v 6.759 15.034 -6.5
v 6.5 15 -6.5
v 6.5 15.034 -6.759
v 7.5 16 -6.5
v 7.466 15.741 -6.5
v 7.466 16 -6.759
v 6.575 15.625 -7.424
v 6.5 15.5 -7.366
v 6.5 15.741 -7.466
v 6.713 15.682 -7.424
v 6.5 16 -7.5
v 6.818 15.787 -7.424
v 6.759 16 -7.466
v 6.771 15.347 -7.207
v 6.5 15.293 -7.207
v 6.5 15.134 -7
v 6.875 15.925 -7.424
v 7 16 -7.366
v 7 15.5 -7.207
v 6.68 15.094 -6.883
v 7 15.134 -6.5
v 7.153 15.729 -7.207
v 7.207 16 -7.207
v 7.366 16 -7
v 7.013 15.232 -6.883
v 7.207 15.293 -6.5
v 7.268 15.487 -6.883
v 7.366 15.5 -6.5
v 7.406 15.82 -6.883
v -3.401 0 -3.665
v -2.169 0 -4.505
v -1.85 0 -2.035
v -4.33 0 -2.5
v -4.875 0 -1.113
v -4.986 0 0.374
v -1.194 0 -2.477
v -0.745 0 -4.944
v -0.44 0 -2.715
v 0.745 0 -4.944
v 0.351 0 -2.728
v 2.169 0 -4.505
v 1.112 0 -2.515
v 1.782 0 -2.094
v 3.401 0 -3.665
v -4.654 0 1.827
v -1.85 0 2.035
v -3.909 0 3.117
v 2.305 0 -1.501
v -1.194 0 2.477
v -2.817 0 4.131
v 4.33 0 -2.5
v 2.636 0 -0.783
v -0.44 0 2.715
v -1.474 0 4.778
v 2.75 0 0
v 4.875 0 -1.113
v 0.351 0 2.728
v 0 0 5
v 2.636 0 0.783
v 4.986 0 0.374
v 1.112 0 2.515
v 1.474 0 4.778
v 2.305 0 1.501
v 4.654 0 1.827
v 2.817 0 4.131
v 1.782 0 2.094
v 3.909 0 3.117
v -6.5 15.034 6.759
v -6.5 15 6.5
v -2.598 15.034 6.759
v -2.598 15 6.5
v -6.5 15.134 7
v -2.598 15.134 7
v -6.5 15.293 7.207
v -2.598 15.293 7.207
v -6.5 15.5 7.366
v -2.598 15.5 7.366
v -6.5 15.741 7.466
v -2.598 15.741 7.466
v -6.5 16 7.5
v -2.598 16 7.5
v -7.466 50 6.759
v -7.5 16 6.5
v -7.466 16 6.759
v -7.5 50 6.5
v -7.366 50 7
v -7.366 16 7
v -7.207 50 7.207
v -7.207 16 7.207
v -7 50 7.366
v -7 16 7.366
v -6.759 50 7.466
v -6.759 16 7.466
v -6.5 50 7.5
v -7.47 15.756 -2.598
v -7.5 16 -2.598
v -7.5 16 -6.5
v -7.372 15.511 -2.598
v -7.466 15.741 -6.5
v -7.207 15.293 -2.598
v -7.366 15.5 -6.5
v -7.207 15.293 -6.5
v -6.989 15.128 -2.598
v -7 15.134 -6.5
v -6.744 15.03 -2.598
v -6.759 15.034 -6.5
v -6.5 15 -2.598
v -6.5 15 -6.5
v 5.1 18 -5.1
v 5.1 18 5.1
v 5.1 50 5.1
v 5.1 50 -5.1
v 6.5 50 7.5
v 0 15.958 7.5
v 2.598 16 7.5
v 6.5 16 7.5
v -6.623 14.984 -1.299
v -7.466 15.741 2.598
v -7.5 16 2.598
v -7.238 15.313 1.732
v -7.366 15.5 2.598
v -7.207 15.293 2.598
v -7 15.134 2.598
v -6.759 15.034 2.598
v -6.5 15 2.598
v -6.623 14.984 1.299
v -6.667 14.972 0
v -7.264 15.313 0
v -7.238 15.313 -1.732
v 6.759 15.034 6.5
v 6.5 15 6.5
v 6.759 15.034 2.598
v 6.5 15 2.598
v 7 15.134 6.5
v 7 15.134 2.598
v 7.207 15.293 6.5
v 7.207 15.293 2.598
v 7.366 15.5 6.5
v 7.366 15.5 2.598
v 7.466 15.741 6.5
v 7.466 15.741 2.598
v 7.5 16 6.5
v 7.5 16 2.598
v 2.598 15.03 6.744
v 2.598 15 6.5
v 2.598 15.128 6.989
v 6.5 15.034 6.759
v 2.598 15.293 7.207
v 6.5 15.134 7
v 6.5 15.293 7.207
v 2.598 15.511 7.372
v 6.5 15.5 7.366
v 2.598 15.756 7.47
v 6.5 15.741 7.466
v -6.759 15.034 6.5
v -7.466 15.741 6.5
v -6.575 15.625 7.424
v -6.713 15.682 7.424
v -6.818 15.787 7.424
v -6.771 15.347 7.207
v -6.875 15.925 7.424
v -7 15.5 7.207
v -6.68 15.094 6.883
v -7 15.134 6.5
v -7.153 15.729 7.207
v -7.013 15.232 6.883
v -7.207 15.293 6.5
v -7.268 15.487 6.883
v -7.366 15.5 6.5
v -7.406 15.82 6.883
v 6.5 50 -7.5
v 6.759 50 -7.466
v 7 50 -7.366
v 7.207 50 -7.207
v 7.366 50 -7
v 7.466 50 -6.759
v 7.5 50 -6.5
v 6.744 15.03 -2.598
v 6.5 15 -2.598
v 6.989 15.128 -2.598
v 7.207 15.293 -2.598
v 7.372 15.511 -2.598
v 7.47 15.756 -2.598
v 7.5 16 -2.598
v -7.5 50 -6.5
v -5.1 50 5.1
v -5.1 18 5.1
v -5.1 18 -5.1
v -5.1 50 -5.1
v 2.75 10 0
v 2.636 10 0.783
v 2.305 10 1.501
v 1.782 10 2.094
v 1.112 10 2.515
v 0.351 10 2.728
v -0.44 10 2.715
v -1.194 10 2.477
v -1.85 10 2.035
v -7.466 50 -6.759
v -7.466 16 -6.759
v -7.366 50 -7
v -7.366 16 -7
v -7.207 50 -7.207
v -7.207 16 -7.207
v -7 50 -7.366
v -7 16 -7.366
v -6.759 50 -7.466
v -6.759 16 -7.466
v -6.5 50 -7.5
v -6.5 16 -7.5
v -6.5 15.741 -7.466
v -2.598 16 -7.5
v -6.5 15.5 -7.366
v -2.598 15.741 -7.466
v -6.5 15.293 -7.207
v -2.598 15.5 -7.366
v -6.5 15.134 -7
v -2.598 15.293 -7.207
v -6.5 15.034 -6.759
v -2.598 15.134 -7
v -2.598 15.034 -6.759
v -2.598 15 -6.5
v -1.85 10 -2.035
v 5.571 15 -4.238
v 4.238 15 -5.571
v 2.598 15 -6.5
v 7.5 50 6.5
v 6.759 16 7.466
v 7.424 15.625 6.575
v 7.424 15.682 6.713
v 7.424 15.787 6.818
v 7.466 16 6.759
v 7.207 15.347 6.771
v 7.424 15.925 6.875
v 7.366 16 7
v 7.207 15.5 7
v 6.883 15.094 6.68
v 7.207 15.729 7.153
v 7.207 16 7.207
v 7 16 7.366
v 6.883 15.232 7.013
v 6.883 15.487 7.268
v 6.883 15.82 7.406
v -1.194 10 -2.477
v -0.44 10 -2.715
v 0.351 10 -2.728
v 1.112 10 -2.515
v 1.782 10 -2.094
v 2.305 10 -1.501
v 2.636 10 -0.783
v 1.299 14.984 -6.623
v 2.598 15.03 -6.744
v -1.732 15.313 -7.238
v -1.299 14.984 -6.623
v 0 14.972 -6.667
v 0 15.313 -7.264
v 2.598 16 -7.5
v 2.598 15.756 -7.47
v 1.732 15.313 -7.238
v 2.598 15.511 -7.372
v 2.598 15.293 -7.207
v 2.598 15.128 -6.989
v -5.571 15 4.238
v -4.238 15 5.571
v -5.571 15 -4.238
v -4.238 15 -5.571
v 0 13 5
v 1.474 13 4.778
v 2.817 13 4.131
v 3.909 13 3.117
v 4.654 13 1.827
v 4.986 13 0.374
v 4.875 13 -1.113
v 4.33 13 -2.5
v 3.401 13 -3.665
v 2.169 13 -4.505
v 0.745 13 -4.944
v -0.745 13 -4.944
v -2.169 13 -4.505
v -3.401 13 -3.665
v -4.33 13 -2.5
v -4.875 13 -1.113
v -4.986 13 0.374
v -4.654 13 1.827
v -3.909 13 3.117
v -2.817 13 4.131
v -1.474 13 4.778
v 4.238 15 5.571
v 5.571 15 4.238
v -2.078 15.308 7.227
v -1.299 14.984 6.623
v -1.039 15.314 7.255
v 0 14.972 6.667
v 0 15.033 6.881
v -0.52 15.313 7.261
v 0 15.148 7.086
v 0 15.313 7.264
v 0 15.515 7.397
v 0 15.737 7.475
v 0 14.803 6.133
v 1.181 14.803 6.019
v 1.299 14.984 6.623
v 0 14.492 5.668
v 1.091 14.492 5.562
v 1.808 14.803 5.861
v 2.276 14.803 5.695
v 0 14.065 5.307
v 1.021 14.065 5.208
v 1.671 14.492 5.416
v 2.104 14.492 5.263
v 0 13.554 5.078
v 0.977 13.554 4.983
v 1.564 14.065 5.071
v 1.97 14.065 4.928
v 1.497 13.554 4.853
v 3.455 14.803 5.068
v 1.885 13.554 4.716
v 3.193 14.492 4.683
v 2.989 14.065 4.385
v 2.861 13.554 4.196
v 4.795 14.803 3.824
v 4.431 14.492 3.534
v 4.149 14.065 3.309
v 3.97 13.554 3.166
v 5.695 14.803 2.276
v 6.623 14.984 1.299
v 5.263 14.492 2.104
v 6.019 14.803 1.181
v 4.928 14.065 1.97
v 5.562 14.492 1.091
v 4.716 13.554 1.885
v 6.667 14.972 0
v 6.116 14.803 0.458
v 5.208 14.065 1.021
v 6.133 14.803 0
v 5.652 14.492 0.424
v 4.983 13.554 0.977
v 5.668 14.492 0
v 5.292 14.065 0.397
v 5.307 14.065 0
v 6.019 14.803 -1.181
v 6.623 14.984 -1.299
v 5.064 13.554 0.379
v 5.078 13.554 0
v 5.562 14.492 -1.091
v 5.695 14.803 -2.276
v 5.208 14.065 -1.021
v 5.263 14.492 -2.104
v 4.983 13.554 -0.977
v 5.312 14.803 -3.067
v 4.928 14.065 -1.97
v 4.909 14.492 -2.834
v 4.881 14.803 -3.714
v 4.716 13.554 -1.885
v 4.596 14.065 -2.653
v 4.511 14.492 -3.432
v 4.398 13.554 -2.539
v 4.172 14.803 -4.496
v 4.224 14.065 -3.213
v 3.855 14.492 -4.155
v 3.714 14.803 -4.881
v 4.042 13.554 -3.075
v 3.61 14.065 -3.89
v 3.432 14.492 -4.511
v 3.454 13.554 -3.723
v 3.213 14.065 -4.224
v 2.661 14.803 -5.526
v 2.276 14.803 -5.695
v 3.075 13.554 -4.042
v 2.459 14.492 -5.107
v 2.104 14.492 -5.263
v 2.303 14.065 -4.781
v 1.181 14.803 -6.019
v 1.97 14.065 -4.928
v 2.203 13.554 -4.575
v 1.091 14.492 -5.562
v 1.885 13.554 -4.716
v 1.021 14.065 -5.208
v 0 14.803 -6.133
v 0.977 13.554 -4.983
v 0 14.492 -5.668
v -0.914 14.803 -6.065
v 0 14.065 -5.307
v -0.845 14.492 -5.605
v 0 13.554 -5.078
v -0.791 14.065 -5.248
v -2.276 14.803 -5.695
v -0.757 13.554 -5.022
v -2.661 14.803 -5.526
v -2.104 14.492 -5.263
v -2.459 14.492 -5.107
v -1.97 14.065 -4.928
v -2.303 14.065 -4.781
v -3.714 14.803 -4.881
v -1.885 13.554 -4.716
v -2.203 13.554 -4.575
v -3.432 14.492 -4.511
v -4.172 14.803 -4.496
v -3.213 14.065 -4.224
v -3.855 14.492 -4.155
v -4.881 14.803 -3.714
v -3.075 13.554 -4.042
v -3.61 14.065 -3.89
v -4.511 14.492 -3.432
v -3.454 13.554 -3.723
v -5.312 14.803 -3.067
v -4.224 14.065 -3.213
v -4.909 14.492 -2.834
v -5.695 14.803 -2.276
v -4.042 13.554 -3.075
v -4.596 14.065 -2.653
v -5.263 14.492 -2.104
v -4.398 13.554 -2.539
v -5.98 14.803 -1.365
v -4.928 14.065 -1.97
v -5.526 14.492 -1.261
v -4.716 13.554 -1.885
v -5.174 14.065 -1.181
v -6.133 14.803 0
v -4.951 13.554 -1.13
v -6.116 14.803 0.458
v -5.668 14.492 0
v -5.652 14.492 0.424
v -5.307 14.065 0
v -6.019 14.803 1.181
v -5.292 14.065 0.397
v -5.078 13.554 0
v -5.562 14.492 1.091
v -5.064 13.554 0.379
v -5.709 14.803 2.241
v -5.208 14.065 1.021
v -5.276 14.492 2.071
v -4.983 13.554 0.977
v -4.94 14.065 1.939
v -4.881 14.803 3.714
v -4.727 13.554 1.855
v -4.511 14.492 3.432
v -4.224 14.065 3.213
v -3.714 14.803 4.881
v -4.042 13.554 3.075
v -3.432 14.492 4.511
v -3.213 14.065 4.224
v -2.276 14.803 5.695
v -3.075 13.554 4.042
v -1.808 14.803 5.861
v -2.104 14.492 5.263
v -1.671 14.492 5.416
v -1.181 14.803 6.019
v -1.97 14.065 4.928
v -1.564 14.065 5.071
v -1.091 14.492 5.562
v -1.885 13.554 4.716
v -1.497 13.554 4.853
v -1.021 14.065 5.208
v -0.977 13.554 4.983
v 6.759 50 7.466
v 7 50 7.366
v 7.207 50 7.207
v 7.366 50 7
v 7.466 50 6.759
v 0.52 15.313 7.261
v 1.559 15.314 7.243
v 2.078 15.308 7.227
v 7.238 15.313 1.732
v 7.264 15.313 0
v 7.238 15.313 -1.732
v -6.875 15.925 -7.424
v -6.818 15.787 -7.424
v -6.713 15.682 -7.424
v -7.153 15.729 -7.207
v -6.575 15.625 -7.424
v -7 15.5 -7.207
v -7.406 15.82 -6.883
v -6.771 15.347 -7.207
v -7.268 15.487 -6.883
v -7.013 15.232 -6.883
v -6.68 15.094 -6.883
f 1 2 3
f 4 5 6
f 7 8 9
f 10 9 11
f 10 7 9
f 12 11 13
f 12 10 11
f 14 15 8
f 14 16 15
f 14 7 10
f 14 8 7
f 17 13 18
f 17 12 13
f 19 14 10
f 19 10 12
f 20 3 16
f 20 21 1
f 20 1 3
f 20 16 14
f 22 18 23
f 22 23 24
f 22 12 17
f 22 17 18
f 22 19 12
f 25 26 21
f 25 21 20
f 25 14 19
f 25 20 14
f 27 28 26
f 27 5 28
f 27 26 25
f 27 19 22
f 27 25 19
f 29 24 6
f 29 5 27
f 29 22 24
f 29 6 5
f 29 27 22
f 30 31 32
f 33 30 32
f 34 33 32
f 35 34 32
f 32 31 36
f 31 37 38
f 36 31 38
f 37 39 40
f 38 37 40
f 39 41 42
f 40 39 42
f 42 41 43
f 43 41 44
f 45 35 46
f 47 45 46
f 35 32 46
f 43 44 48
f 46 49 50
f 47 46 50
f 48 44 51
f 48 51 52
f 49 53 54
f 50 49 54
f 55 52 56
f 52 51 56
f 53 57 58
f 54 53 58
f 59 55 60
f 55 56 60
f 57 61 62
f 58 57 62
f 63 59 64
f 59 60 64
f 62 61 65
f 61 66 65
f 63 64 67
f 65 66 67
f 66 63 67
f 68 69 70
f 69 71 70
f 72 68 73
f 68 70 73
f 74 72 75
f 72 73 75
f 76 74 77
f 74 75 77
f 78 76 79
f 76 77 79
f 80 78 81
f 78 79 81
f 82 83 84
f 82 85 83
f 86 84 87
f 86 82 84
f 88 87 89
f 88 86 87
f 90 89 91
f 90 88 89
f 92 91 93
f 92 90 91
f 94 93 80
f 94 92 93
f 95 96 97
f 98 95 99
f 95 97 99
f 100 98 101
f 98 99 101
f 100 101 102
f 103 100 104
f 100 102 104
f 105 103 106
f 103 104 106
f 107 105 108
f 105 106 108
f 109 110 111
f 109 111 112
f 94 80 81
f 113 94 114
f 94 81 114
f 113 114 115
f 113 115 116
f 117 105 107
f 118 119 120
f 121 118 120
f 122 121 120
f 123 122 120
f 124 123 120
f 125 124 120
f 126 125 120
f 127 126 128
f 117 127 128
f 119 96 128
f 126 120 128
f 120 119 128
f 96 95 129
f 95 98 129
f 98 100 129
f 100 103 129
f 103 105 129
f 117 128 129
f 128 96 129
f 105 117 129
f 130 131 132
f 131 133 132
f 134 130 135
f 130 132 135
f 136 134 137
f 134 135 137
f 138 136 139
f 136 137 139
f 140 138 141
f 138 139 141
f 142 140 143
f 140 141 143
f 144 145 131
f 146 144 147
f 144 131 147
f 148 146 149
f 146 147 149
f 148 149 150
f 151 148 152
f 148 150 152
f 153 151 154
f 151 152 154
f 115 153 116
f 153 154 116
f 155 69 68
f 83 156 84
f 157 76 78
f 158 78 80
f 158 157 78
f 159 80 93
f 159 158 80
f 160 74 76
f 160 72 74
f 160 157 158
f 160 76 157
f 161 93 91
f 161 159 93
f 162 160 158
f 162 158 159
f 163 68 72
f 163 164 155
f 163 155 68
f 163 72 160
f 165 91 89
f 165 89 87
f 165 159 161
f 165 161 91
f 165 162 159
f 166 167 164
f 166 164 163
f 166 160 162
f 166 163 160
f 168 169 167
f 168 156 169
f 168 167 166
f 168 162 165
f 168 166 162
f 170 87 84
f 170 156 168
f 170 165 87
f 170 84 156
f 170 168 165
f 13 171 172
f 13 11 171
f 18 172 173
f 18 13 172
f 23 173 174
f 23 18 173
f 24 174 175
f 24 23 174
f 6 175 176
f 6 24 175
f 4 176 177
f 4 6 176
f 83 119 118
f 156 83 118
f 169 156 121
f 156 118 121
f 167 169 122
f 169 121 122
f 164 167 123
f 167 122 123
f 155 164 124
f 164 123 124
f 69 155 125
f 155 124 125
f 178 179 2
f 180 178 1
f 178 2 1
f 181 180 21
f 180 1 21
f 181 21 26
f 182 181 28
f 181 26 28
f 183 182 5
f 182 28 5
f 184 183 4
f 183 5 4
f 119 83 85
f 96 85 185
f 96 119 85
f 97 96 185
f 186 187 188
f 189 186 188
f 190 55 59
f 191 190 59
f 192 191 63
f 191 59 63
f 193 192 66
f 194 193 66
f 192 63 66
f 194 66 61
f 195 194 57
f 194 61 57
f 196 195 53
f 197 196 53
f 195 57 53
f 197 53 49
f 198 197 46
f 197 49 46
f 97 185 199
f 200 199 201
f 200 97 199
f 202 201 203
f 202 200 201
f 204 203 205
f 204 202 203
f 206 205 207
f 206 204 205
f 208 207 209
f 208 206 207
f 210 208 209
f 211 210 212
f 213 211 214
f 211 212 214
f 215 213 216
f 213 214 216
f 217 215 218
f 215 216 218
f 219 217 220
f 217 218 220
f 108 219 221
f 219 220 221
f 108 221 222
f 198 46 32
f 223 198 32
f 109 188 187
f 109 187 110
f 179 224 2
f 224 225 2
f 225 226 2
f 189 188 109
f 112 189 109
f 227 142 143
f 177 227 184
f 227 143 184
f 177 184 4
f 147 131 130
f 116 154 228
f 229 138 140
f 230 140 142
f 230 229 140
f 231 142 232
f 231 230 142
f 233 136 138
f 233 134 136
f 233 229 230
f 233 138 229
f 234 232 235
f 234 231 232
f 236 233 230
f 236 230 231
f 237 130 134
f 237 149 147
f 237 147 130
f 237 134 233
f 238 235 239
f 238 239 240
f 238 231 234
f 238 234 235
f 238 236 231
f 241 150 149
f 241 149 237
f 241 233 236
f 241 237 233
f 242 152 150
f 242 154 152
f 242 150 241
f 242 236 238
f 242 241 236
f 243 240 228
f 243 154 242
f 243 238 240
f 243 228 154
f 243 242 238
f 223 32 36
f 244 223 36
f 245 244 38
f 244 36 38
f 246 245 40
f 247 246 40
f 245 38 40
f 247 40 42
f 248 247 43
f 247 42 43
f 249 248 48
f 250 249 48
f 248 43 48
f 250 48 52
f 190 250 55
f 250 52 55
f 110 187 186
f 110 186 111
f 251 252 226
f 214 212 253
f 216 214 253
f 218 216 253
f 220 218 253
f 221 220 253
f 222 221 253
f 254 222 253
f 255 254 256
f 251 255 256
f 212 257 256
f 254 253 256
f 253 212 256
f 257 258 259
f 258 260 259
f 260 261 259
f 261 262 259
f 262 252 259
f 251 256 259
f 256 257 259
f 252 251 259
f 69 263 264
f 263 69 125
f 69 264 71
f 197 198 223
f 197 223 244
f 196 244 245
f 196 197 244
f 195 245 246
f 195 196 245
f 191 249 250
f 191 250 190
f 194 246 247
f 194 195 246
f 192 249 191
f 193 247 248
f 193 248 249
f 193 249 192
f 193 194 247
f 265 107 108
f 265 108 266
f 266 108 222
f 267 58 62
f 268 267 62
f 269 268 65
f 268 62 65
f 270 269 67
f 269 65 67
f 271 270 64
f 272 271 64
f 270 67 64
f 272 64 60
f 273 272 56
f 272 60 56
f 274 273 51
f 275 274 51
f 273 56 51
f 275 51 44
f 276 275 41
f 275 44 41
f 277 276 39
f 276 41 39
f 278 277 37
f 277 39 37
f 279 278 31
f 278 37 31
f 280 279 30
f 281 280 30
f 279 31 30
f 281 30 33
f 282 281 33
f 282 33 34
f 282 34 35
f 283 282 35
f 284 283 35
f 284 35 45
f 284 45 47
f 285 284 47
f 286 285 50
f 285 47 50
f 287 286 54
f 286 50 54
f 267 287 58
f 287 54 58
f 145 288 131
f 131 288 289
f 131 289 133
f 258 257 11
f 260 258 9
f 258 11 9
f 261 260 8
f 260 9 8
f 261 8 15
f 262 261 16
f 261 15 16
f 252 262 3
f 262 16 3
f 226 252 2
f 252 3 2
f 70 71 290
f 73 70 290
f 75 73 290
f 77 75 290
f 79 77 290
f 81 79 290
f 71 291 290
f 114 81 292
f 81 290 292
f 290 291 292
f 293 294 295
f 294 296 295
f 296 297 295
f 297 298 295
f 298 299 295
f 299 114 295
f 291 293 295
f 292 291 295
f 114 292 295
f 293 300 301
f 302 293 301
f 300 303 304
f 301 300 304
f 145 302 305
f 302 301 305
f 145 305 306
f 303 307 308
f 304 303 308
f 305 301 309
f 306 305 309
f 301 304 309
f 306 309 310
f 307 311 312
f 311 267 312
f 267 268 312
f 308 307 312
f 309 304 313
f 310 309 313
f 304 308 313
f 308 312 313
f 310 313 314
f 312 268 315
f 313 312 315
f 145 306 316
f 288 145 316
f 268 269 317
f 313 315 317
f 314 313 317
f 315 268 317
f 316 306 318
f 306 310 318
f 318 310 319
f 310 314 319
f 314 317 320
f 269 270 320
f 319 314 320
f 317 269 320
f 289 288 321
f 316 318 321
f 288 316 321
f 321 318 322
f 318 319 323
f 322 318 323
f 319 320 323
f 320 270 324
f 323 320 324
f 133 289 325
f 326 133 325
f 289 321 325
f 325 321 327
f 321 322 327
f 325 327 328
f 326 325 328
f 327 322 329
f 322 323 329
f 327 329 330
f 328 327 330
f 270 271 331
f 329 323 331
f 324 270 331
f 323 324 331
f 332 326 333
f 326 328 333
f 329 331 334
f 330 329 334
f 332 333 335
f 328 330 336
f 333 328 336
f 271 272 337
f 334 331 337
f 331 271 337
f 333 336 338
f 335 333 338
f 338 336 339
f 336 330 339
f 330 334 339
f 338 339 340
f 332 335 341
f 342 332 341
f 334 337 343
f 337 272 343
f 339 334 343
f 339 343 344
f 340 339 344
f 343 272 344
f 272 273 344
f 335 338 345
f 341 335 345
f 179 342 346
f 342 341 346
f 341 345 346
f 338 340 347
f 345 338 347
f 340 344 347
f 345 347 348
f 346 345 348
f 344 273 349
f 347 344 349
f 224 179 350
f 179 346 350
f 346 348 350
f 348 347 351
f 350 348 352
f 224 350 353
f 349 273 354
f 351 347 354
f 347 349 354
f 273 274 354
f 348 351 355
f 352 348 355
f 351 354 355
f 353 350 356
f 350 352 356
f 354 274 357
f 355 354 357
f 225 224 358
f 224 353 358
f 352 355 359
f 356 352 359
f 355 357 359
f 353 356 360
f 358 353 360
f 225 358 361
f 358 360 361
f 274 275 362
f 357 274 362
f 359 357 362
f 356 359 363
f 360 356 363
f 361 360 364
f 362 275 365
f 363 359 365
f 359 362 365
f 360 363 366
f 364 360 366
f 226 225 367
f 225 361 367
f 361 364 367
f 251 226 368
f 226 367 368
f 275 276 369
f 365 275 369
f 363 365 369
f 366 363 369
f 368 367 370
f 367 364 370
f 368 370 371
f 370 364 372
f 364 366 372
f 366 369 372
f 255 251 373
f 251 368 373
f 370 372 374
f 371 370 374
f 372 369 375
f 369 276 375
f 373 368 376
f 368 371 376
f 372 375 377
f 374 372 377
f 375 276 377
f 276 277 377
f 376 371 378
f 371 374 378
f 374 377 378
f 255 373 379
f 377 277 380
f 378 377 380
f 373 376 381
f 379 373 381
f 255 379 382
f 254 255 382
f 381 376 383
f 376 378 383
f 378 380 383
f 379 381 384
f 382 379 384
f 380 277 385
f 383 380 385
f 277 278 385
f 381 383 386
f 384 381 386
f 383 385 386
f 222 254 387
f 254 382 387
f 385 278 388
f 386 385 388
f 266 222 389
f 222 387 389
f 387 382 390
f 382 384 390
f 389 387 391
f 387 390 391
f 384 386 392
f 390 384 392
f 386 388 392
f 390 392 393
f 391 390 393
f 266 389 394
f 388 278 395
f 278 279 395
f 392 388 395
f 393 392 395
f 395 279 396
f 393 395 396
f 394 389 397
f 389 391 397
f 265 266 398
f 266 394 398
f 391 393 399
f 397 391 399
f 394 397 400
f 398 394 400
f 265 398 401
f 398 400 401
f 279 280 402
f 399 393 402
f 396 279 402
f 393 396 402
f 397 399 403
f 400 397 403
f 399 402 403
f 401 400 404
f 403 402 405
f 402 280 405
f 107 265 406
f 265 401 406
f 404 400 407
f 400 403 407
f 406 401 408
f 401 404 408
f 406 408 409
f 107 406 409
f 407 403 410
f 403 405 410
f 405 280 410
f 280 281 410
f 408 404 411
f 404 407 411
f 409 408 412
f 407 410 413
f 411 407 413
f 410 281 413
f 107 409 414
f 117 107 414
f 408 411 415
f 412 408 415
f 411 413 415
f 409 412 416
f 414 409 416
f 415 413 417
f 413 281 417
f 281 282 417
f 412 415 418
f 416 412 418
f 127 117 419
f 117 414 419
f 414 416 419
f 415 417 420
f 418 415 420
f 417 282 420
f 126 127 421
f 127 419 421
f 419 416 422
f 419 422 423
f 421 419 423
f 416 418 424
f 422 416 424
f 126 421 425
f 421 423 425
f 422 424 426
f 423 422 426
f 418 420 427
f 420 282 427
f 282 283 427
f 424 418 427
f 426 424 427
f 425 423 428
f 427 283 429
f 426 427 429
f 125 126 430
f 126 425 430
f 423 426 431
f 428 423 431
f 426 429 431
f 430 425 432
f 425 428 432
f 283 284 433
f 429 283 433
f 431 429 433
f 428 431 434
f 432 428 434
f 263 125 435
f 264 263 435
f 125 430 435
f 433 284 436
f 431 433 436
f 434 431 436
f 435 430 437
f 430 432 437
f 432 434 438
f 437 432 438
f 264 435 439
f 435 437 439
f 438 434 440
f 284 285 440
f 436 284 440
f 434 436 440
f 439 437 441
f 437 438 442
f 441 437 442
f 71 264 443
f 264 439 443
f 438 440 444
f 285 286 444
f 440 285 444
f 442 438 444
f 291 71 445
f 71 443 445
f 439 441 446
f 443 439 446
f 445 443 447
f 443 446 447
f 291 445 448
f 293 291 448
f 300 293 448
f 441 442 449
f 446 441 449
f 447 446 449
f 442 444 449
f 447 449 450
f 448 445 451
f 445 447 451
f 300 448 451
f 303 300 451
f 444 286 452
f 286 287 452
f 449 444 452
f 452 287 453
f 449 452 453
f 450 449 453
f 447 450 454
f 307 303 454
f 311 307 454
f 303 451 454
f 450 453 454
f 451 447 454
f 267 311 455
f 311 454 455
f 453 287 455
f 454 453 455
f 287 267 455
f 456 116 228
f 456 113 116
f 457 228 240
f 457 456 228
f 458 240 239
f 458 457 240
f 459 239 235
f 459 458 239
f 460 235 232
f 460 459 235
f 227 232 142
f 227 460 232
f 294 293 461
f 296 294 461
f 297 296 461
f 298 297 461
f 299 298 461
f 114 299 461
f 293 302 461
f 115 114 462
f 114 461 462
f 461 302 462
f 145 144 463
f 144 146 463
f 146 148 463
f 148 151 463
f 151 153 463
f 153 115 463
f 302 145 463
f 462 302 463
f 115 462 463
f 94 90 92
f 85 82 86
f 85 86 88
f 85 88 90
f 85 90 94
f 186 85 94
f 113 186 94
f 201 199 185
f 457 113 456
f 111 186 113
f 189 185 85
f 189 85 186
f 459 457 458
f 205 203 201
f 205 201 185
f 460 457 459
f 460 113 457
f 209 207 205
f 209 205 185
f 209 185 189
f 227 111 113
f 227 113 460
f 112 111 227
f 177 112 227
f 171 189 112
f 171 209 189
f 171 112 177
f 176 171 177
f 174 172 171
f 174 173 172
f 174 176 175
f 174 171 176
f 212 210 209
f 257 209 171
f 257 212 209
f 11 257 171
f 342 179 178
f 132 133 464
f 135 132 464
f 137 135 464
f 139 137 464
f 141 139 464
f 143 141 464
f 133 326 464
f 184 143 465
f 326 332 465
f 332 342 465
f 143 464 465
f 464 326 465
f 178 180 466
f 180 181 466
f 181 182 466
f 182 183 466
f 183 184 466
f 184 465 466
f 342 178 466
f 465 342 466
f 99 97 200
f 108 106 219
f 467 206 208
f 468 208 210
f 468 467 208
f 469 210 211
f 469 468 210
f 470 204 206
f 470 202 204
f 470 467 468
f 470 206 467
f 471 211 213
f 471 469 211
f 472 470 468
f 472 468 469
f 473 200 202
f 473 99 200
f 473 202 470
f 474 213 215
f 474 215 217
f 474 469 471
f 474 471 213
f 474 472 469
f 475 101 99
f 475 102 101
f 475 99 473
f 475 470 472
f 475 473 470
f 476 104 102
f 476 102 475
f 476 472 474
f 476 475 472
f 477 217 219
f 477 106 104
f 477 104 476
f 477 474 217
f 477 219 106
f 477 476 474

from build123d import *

# Parameters (mm, degrees)
SKETCH_1_R          = 5
EXTRUDE_1_DEPTH     = 15
SKETCH_2_W          = 15
SKETCH_2_H          = 15
EXTRUDE_2_DEPTH     = 3
FILLET_1_R          = 2
SKETCH_3_W          = 15
SKETCH_3_H          = 15
SKETCH_3_W_2        = 10.2
SKETCH_3_H_2        = 10.2
EXTRUDE_3_DEPTH     = 32
CUT_EXTRUDE_1_DEPTH = 10
FILLET_2_R          = 1


with BuildPart() as part:
    # 草图1 → 凸台-拉伸1 (new body)
    with BuildSketch(Plane(origin=(0, 0, 0), x_dir=(1, 0, 0), z_dir=(0, 1, 0))):
        with Locations(Location((0, 0, 0), (0, 0, 270))):
            Circle(SKETCH_1_R)
    extrude(amount=EXTRUDE_1_DEPTH)

    # 草图2 → 凸台-拉伸2 (add)
    with BuildSketch(Plane(origin=(0, 15, 0), x_dir=(1, 0, 0), z_dir=(0, 1, 0))):
        Rectangle(SKETCH_2_W, SKETCH_2_H)
    extrude(amount=EXTRUDE_2_DEPTH)

    # 圆角1
    fillet_1_edges = [part.edges().sort_by_distance(p)[0] for p in [
        (0, 15, -5),
    ]]
    fillet(fillet_1_edges, radius=FILLET_1_R)

    # 草图3 → 凸台-拉伸3 (add)
    with BuildSketch(Plane(origin=(0, 18, 0), x_dir=(1, 0, 0), z_dir=(0, 1, 0))):
        Rectangle(SKETCH_3_W, SKETCH_3_H)
        Rectangle(SKETCH_3_W_2, SKETCH_3_H_2, mode=Mode.SUBTRACT)
    extrude(amount=EXTRUDE_3_DEPTH)

    # 草图4 → 切除-拉伸1 (cut)
    with BuildSketch(Plane.XZ):
        with BuildLine():
            Line((-1.85, 2.034698995), (-1.85, -2.034698995))
            ThreePointArc((-1.85, -2.034698995), (1.112429773, -2.514955268), (2.75, 0))
            ThreePointArc((2.75, 0), (1.112429773, 2.514955268), (-1.85, 2.034698995))
        make_face()
    extrude(amount=-CUT_EXTRUDE_1_DEPTH, mode=Mode.SUBTRACT)

    # 圆角2
    fillet_2_edges = [part.edges().sort_by_distance(p)[0] for p in [
        (-7.5, 15, 0),
        (-7.5, 32.5, -7.5),
        (0, 15, 7.5),
        (-7.5, 32.5, 7.5),
        (7.5, 15, 0),
        (7.5, 32.5, 7.5),
        (0, 15, -7.5),
        (7.5, 32.5, -7.5),
    ]]
    fillet(fillet_2_edges, radius=FILLET_2_R)


solid = part.part
